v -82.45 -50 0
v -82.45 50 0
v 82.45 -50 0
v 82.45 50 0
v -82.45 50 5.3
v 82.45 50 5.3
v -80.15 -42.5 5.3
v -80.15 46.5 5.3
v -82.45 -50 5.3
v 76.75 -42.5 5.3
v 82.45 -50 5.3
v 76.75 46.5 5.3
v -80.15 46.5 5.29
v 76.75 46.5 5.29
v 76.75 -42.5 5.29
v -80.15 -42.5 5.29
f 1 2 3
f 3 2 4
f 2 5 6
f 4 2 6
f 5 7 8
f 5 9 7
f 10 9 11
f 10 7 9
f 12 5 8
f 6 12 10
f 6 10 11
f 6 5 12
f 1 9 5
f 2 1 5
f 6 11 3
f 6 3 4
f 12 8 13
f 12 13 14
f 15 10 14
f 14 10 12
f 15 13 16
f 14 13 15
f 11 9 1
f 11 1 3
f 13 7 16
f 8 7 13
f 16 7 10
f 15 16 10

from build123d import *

# Parameters (mm, degrees)
SKETCH2_W                  = 180
SKETCH2_H                  = 104
PCB_DEPTH                  = 1.6
F_3_2_3_2_DIAMETER_HOLE1_D = 3.2
SKETCH5_W                  = 164.9
SKETCH5_H                  = 100
BEZEL_DEPTH                = 3.7
SKETCH6_W                  = 156.9
SKETCH6_H                  = 89
VISUAL_AREA_VA_DEPTH       = 0.01
F_1_0_1_DIAMETER_HOLE1_D   = 1
SKETCH12_W                 = 180
SKETCH12_H                 = 104
SKETCH12_W_2               = 164.9
SKETCH12_H_2               = 100
CUT_EXTRUDE1_DEPTH         = 6.3


with BuildPart() as part:
    # Sketch2 → PCB (new body)
    with BuildSketch(Plane.XY):
        Rectangle(SKETCH2_W, SKETCH2_H)
    extrude(amount=PCB_DEPTH)

    # Ø3.2 (3.2) Diameter Hole1 (through all)
    with Locations(Plane.XY.offset(1.6)):
        with Locations((-87, 49), (87, 49), (87, -49), (-87, -49)):
            Hole(F_3_2_3_2_DIAMETER_HOLE1_D / 2)

    # Sketch5 → Bezel (add)
    with BuildSketch(Plane.XY.offset(1.6)):
        Rectangle(SKETCH5_W, SKETCH5_H)
    extrude(amount=BEZEL_DEPTH)

    # Sketch6 → Visual Area (VA) (cut)
    with BuildSketch(Plane.XY.offset(5.3)):
        with Locations((-1.7, 2)):
            Rectangle(SKETCH6_W, SKETCH6_H)
    extrude(amount=-VISUAL_AREA_VA_DEPTH, mode=Mode.SUBTRACT)

    # Ø1.0 (1) Diameter Hole1 (through all)
    with Locations(Plane.XY.offset(1.6)):
        with Locations((88.5, -41.91), (85.96, -41.91), (85.96, -39.37), (85.96, -36.83), (85.96, -34.29), (88.5, -39.37), (88.5, -36.83), (88.5, -34.29), (88.5, -24.13), (85.96, -24.13), (85.96, -21.59), (85.96, -19.05), (85.96, -16.51), (85.96, -13.97), (85.96, -11.43), (85.96, -8.89), (85.96, -6.35), (85.96, -3.81), (85.96, -1.27), (85.96, 1.27), (85.96, 3.81), (85.96, 6.35), (85.96, 8.89), (85.96, 11.43), (85.96, 13.97), (85.96, 16.51), (85.96, 19.05), (85.96, 21.59), (85.96, 24.13), (88.5, -21.59), (88.5, -19.05), (88.5, -16.51), (88.5, -13.97), (88.5, -11.43), (88.5, -8.89), (88.5, -6.35), (88.5, -3.81), (88.5, -1.27), (88.5, 1.27), (88.5, 3.81), (88.5, 6.35), (88.5, 8.89), (88.5, 11.43), (88.5, 13.97), (88.5, 16.51), (88.5, 19.05), (88.5, 21.59), (88.5, 24.13), (88.5, 34.29), (85.96, 34.29), (85.96, 36.83), (85.96, 39.37), (85.96, 41.91), (88.5, 36.83), (88.5, 39.37), (88.5, 41.91)):
            Hole(F_1_0_1_DIAMETER_HOLE1_D / 2)

    # Sketch12 → Cut-Extrude1 (cut, through all)
    with BuildSketch(Plane.XY.offset(5.3)):
        Rectangle(SKETCH12_W, SKETCH12_H)
        Rectangle(SKETCH12_W_2, SKETCH12_H_2, mode=Mode.SUBTRACT)
    extrude(amount=-CUT_EXTRUDE1_DEPTH, mode=Mode.SUBTRACT)


solid = part.part
